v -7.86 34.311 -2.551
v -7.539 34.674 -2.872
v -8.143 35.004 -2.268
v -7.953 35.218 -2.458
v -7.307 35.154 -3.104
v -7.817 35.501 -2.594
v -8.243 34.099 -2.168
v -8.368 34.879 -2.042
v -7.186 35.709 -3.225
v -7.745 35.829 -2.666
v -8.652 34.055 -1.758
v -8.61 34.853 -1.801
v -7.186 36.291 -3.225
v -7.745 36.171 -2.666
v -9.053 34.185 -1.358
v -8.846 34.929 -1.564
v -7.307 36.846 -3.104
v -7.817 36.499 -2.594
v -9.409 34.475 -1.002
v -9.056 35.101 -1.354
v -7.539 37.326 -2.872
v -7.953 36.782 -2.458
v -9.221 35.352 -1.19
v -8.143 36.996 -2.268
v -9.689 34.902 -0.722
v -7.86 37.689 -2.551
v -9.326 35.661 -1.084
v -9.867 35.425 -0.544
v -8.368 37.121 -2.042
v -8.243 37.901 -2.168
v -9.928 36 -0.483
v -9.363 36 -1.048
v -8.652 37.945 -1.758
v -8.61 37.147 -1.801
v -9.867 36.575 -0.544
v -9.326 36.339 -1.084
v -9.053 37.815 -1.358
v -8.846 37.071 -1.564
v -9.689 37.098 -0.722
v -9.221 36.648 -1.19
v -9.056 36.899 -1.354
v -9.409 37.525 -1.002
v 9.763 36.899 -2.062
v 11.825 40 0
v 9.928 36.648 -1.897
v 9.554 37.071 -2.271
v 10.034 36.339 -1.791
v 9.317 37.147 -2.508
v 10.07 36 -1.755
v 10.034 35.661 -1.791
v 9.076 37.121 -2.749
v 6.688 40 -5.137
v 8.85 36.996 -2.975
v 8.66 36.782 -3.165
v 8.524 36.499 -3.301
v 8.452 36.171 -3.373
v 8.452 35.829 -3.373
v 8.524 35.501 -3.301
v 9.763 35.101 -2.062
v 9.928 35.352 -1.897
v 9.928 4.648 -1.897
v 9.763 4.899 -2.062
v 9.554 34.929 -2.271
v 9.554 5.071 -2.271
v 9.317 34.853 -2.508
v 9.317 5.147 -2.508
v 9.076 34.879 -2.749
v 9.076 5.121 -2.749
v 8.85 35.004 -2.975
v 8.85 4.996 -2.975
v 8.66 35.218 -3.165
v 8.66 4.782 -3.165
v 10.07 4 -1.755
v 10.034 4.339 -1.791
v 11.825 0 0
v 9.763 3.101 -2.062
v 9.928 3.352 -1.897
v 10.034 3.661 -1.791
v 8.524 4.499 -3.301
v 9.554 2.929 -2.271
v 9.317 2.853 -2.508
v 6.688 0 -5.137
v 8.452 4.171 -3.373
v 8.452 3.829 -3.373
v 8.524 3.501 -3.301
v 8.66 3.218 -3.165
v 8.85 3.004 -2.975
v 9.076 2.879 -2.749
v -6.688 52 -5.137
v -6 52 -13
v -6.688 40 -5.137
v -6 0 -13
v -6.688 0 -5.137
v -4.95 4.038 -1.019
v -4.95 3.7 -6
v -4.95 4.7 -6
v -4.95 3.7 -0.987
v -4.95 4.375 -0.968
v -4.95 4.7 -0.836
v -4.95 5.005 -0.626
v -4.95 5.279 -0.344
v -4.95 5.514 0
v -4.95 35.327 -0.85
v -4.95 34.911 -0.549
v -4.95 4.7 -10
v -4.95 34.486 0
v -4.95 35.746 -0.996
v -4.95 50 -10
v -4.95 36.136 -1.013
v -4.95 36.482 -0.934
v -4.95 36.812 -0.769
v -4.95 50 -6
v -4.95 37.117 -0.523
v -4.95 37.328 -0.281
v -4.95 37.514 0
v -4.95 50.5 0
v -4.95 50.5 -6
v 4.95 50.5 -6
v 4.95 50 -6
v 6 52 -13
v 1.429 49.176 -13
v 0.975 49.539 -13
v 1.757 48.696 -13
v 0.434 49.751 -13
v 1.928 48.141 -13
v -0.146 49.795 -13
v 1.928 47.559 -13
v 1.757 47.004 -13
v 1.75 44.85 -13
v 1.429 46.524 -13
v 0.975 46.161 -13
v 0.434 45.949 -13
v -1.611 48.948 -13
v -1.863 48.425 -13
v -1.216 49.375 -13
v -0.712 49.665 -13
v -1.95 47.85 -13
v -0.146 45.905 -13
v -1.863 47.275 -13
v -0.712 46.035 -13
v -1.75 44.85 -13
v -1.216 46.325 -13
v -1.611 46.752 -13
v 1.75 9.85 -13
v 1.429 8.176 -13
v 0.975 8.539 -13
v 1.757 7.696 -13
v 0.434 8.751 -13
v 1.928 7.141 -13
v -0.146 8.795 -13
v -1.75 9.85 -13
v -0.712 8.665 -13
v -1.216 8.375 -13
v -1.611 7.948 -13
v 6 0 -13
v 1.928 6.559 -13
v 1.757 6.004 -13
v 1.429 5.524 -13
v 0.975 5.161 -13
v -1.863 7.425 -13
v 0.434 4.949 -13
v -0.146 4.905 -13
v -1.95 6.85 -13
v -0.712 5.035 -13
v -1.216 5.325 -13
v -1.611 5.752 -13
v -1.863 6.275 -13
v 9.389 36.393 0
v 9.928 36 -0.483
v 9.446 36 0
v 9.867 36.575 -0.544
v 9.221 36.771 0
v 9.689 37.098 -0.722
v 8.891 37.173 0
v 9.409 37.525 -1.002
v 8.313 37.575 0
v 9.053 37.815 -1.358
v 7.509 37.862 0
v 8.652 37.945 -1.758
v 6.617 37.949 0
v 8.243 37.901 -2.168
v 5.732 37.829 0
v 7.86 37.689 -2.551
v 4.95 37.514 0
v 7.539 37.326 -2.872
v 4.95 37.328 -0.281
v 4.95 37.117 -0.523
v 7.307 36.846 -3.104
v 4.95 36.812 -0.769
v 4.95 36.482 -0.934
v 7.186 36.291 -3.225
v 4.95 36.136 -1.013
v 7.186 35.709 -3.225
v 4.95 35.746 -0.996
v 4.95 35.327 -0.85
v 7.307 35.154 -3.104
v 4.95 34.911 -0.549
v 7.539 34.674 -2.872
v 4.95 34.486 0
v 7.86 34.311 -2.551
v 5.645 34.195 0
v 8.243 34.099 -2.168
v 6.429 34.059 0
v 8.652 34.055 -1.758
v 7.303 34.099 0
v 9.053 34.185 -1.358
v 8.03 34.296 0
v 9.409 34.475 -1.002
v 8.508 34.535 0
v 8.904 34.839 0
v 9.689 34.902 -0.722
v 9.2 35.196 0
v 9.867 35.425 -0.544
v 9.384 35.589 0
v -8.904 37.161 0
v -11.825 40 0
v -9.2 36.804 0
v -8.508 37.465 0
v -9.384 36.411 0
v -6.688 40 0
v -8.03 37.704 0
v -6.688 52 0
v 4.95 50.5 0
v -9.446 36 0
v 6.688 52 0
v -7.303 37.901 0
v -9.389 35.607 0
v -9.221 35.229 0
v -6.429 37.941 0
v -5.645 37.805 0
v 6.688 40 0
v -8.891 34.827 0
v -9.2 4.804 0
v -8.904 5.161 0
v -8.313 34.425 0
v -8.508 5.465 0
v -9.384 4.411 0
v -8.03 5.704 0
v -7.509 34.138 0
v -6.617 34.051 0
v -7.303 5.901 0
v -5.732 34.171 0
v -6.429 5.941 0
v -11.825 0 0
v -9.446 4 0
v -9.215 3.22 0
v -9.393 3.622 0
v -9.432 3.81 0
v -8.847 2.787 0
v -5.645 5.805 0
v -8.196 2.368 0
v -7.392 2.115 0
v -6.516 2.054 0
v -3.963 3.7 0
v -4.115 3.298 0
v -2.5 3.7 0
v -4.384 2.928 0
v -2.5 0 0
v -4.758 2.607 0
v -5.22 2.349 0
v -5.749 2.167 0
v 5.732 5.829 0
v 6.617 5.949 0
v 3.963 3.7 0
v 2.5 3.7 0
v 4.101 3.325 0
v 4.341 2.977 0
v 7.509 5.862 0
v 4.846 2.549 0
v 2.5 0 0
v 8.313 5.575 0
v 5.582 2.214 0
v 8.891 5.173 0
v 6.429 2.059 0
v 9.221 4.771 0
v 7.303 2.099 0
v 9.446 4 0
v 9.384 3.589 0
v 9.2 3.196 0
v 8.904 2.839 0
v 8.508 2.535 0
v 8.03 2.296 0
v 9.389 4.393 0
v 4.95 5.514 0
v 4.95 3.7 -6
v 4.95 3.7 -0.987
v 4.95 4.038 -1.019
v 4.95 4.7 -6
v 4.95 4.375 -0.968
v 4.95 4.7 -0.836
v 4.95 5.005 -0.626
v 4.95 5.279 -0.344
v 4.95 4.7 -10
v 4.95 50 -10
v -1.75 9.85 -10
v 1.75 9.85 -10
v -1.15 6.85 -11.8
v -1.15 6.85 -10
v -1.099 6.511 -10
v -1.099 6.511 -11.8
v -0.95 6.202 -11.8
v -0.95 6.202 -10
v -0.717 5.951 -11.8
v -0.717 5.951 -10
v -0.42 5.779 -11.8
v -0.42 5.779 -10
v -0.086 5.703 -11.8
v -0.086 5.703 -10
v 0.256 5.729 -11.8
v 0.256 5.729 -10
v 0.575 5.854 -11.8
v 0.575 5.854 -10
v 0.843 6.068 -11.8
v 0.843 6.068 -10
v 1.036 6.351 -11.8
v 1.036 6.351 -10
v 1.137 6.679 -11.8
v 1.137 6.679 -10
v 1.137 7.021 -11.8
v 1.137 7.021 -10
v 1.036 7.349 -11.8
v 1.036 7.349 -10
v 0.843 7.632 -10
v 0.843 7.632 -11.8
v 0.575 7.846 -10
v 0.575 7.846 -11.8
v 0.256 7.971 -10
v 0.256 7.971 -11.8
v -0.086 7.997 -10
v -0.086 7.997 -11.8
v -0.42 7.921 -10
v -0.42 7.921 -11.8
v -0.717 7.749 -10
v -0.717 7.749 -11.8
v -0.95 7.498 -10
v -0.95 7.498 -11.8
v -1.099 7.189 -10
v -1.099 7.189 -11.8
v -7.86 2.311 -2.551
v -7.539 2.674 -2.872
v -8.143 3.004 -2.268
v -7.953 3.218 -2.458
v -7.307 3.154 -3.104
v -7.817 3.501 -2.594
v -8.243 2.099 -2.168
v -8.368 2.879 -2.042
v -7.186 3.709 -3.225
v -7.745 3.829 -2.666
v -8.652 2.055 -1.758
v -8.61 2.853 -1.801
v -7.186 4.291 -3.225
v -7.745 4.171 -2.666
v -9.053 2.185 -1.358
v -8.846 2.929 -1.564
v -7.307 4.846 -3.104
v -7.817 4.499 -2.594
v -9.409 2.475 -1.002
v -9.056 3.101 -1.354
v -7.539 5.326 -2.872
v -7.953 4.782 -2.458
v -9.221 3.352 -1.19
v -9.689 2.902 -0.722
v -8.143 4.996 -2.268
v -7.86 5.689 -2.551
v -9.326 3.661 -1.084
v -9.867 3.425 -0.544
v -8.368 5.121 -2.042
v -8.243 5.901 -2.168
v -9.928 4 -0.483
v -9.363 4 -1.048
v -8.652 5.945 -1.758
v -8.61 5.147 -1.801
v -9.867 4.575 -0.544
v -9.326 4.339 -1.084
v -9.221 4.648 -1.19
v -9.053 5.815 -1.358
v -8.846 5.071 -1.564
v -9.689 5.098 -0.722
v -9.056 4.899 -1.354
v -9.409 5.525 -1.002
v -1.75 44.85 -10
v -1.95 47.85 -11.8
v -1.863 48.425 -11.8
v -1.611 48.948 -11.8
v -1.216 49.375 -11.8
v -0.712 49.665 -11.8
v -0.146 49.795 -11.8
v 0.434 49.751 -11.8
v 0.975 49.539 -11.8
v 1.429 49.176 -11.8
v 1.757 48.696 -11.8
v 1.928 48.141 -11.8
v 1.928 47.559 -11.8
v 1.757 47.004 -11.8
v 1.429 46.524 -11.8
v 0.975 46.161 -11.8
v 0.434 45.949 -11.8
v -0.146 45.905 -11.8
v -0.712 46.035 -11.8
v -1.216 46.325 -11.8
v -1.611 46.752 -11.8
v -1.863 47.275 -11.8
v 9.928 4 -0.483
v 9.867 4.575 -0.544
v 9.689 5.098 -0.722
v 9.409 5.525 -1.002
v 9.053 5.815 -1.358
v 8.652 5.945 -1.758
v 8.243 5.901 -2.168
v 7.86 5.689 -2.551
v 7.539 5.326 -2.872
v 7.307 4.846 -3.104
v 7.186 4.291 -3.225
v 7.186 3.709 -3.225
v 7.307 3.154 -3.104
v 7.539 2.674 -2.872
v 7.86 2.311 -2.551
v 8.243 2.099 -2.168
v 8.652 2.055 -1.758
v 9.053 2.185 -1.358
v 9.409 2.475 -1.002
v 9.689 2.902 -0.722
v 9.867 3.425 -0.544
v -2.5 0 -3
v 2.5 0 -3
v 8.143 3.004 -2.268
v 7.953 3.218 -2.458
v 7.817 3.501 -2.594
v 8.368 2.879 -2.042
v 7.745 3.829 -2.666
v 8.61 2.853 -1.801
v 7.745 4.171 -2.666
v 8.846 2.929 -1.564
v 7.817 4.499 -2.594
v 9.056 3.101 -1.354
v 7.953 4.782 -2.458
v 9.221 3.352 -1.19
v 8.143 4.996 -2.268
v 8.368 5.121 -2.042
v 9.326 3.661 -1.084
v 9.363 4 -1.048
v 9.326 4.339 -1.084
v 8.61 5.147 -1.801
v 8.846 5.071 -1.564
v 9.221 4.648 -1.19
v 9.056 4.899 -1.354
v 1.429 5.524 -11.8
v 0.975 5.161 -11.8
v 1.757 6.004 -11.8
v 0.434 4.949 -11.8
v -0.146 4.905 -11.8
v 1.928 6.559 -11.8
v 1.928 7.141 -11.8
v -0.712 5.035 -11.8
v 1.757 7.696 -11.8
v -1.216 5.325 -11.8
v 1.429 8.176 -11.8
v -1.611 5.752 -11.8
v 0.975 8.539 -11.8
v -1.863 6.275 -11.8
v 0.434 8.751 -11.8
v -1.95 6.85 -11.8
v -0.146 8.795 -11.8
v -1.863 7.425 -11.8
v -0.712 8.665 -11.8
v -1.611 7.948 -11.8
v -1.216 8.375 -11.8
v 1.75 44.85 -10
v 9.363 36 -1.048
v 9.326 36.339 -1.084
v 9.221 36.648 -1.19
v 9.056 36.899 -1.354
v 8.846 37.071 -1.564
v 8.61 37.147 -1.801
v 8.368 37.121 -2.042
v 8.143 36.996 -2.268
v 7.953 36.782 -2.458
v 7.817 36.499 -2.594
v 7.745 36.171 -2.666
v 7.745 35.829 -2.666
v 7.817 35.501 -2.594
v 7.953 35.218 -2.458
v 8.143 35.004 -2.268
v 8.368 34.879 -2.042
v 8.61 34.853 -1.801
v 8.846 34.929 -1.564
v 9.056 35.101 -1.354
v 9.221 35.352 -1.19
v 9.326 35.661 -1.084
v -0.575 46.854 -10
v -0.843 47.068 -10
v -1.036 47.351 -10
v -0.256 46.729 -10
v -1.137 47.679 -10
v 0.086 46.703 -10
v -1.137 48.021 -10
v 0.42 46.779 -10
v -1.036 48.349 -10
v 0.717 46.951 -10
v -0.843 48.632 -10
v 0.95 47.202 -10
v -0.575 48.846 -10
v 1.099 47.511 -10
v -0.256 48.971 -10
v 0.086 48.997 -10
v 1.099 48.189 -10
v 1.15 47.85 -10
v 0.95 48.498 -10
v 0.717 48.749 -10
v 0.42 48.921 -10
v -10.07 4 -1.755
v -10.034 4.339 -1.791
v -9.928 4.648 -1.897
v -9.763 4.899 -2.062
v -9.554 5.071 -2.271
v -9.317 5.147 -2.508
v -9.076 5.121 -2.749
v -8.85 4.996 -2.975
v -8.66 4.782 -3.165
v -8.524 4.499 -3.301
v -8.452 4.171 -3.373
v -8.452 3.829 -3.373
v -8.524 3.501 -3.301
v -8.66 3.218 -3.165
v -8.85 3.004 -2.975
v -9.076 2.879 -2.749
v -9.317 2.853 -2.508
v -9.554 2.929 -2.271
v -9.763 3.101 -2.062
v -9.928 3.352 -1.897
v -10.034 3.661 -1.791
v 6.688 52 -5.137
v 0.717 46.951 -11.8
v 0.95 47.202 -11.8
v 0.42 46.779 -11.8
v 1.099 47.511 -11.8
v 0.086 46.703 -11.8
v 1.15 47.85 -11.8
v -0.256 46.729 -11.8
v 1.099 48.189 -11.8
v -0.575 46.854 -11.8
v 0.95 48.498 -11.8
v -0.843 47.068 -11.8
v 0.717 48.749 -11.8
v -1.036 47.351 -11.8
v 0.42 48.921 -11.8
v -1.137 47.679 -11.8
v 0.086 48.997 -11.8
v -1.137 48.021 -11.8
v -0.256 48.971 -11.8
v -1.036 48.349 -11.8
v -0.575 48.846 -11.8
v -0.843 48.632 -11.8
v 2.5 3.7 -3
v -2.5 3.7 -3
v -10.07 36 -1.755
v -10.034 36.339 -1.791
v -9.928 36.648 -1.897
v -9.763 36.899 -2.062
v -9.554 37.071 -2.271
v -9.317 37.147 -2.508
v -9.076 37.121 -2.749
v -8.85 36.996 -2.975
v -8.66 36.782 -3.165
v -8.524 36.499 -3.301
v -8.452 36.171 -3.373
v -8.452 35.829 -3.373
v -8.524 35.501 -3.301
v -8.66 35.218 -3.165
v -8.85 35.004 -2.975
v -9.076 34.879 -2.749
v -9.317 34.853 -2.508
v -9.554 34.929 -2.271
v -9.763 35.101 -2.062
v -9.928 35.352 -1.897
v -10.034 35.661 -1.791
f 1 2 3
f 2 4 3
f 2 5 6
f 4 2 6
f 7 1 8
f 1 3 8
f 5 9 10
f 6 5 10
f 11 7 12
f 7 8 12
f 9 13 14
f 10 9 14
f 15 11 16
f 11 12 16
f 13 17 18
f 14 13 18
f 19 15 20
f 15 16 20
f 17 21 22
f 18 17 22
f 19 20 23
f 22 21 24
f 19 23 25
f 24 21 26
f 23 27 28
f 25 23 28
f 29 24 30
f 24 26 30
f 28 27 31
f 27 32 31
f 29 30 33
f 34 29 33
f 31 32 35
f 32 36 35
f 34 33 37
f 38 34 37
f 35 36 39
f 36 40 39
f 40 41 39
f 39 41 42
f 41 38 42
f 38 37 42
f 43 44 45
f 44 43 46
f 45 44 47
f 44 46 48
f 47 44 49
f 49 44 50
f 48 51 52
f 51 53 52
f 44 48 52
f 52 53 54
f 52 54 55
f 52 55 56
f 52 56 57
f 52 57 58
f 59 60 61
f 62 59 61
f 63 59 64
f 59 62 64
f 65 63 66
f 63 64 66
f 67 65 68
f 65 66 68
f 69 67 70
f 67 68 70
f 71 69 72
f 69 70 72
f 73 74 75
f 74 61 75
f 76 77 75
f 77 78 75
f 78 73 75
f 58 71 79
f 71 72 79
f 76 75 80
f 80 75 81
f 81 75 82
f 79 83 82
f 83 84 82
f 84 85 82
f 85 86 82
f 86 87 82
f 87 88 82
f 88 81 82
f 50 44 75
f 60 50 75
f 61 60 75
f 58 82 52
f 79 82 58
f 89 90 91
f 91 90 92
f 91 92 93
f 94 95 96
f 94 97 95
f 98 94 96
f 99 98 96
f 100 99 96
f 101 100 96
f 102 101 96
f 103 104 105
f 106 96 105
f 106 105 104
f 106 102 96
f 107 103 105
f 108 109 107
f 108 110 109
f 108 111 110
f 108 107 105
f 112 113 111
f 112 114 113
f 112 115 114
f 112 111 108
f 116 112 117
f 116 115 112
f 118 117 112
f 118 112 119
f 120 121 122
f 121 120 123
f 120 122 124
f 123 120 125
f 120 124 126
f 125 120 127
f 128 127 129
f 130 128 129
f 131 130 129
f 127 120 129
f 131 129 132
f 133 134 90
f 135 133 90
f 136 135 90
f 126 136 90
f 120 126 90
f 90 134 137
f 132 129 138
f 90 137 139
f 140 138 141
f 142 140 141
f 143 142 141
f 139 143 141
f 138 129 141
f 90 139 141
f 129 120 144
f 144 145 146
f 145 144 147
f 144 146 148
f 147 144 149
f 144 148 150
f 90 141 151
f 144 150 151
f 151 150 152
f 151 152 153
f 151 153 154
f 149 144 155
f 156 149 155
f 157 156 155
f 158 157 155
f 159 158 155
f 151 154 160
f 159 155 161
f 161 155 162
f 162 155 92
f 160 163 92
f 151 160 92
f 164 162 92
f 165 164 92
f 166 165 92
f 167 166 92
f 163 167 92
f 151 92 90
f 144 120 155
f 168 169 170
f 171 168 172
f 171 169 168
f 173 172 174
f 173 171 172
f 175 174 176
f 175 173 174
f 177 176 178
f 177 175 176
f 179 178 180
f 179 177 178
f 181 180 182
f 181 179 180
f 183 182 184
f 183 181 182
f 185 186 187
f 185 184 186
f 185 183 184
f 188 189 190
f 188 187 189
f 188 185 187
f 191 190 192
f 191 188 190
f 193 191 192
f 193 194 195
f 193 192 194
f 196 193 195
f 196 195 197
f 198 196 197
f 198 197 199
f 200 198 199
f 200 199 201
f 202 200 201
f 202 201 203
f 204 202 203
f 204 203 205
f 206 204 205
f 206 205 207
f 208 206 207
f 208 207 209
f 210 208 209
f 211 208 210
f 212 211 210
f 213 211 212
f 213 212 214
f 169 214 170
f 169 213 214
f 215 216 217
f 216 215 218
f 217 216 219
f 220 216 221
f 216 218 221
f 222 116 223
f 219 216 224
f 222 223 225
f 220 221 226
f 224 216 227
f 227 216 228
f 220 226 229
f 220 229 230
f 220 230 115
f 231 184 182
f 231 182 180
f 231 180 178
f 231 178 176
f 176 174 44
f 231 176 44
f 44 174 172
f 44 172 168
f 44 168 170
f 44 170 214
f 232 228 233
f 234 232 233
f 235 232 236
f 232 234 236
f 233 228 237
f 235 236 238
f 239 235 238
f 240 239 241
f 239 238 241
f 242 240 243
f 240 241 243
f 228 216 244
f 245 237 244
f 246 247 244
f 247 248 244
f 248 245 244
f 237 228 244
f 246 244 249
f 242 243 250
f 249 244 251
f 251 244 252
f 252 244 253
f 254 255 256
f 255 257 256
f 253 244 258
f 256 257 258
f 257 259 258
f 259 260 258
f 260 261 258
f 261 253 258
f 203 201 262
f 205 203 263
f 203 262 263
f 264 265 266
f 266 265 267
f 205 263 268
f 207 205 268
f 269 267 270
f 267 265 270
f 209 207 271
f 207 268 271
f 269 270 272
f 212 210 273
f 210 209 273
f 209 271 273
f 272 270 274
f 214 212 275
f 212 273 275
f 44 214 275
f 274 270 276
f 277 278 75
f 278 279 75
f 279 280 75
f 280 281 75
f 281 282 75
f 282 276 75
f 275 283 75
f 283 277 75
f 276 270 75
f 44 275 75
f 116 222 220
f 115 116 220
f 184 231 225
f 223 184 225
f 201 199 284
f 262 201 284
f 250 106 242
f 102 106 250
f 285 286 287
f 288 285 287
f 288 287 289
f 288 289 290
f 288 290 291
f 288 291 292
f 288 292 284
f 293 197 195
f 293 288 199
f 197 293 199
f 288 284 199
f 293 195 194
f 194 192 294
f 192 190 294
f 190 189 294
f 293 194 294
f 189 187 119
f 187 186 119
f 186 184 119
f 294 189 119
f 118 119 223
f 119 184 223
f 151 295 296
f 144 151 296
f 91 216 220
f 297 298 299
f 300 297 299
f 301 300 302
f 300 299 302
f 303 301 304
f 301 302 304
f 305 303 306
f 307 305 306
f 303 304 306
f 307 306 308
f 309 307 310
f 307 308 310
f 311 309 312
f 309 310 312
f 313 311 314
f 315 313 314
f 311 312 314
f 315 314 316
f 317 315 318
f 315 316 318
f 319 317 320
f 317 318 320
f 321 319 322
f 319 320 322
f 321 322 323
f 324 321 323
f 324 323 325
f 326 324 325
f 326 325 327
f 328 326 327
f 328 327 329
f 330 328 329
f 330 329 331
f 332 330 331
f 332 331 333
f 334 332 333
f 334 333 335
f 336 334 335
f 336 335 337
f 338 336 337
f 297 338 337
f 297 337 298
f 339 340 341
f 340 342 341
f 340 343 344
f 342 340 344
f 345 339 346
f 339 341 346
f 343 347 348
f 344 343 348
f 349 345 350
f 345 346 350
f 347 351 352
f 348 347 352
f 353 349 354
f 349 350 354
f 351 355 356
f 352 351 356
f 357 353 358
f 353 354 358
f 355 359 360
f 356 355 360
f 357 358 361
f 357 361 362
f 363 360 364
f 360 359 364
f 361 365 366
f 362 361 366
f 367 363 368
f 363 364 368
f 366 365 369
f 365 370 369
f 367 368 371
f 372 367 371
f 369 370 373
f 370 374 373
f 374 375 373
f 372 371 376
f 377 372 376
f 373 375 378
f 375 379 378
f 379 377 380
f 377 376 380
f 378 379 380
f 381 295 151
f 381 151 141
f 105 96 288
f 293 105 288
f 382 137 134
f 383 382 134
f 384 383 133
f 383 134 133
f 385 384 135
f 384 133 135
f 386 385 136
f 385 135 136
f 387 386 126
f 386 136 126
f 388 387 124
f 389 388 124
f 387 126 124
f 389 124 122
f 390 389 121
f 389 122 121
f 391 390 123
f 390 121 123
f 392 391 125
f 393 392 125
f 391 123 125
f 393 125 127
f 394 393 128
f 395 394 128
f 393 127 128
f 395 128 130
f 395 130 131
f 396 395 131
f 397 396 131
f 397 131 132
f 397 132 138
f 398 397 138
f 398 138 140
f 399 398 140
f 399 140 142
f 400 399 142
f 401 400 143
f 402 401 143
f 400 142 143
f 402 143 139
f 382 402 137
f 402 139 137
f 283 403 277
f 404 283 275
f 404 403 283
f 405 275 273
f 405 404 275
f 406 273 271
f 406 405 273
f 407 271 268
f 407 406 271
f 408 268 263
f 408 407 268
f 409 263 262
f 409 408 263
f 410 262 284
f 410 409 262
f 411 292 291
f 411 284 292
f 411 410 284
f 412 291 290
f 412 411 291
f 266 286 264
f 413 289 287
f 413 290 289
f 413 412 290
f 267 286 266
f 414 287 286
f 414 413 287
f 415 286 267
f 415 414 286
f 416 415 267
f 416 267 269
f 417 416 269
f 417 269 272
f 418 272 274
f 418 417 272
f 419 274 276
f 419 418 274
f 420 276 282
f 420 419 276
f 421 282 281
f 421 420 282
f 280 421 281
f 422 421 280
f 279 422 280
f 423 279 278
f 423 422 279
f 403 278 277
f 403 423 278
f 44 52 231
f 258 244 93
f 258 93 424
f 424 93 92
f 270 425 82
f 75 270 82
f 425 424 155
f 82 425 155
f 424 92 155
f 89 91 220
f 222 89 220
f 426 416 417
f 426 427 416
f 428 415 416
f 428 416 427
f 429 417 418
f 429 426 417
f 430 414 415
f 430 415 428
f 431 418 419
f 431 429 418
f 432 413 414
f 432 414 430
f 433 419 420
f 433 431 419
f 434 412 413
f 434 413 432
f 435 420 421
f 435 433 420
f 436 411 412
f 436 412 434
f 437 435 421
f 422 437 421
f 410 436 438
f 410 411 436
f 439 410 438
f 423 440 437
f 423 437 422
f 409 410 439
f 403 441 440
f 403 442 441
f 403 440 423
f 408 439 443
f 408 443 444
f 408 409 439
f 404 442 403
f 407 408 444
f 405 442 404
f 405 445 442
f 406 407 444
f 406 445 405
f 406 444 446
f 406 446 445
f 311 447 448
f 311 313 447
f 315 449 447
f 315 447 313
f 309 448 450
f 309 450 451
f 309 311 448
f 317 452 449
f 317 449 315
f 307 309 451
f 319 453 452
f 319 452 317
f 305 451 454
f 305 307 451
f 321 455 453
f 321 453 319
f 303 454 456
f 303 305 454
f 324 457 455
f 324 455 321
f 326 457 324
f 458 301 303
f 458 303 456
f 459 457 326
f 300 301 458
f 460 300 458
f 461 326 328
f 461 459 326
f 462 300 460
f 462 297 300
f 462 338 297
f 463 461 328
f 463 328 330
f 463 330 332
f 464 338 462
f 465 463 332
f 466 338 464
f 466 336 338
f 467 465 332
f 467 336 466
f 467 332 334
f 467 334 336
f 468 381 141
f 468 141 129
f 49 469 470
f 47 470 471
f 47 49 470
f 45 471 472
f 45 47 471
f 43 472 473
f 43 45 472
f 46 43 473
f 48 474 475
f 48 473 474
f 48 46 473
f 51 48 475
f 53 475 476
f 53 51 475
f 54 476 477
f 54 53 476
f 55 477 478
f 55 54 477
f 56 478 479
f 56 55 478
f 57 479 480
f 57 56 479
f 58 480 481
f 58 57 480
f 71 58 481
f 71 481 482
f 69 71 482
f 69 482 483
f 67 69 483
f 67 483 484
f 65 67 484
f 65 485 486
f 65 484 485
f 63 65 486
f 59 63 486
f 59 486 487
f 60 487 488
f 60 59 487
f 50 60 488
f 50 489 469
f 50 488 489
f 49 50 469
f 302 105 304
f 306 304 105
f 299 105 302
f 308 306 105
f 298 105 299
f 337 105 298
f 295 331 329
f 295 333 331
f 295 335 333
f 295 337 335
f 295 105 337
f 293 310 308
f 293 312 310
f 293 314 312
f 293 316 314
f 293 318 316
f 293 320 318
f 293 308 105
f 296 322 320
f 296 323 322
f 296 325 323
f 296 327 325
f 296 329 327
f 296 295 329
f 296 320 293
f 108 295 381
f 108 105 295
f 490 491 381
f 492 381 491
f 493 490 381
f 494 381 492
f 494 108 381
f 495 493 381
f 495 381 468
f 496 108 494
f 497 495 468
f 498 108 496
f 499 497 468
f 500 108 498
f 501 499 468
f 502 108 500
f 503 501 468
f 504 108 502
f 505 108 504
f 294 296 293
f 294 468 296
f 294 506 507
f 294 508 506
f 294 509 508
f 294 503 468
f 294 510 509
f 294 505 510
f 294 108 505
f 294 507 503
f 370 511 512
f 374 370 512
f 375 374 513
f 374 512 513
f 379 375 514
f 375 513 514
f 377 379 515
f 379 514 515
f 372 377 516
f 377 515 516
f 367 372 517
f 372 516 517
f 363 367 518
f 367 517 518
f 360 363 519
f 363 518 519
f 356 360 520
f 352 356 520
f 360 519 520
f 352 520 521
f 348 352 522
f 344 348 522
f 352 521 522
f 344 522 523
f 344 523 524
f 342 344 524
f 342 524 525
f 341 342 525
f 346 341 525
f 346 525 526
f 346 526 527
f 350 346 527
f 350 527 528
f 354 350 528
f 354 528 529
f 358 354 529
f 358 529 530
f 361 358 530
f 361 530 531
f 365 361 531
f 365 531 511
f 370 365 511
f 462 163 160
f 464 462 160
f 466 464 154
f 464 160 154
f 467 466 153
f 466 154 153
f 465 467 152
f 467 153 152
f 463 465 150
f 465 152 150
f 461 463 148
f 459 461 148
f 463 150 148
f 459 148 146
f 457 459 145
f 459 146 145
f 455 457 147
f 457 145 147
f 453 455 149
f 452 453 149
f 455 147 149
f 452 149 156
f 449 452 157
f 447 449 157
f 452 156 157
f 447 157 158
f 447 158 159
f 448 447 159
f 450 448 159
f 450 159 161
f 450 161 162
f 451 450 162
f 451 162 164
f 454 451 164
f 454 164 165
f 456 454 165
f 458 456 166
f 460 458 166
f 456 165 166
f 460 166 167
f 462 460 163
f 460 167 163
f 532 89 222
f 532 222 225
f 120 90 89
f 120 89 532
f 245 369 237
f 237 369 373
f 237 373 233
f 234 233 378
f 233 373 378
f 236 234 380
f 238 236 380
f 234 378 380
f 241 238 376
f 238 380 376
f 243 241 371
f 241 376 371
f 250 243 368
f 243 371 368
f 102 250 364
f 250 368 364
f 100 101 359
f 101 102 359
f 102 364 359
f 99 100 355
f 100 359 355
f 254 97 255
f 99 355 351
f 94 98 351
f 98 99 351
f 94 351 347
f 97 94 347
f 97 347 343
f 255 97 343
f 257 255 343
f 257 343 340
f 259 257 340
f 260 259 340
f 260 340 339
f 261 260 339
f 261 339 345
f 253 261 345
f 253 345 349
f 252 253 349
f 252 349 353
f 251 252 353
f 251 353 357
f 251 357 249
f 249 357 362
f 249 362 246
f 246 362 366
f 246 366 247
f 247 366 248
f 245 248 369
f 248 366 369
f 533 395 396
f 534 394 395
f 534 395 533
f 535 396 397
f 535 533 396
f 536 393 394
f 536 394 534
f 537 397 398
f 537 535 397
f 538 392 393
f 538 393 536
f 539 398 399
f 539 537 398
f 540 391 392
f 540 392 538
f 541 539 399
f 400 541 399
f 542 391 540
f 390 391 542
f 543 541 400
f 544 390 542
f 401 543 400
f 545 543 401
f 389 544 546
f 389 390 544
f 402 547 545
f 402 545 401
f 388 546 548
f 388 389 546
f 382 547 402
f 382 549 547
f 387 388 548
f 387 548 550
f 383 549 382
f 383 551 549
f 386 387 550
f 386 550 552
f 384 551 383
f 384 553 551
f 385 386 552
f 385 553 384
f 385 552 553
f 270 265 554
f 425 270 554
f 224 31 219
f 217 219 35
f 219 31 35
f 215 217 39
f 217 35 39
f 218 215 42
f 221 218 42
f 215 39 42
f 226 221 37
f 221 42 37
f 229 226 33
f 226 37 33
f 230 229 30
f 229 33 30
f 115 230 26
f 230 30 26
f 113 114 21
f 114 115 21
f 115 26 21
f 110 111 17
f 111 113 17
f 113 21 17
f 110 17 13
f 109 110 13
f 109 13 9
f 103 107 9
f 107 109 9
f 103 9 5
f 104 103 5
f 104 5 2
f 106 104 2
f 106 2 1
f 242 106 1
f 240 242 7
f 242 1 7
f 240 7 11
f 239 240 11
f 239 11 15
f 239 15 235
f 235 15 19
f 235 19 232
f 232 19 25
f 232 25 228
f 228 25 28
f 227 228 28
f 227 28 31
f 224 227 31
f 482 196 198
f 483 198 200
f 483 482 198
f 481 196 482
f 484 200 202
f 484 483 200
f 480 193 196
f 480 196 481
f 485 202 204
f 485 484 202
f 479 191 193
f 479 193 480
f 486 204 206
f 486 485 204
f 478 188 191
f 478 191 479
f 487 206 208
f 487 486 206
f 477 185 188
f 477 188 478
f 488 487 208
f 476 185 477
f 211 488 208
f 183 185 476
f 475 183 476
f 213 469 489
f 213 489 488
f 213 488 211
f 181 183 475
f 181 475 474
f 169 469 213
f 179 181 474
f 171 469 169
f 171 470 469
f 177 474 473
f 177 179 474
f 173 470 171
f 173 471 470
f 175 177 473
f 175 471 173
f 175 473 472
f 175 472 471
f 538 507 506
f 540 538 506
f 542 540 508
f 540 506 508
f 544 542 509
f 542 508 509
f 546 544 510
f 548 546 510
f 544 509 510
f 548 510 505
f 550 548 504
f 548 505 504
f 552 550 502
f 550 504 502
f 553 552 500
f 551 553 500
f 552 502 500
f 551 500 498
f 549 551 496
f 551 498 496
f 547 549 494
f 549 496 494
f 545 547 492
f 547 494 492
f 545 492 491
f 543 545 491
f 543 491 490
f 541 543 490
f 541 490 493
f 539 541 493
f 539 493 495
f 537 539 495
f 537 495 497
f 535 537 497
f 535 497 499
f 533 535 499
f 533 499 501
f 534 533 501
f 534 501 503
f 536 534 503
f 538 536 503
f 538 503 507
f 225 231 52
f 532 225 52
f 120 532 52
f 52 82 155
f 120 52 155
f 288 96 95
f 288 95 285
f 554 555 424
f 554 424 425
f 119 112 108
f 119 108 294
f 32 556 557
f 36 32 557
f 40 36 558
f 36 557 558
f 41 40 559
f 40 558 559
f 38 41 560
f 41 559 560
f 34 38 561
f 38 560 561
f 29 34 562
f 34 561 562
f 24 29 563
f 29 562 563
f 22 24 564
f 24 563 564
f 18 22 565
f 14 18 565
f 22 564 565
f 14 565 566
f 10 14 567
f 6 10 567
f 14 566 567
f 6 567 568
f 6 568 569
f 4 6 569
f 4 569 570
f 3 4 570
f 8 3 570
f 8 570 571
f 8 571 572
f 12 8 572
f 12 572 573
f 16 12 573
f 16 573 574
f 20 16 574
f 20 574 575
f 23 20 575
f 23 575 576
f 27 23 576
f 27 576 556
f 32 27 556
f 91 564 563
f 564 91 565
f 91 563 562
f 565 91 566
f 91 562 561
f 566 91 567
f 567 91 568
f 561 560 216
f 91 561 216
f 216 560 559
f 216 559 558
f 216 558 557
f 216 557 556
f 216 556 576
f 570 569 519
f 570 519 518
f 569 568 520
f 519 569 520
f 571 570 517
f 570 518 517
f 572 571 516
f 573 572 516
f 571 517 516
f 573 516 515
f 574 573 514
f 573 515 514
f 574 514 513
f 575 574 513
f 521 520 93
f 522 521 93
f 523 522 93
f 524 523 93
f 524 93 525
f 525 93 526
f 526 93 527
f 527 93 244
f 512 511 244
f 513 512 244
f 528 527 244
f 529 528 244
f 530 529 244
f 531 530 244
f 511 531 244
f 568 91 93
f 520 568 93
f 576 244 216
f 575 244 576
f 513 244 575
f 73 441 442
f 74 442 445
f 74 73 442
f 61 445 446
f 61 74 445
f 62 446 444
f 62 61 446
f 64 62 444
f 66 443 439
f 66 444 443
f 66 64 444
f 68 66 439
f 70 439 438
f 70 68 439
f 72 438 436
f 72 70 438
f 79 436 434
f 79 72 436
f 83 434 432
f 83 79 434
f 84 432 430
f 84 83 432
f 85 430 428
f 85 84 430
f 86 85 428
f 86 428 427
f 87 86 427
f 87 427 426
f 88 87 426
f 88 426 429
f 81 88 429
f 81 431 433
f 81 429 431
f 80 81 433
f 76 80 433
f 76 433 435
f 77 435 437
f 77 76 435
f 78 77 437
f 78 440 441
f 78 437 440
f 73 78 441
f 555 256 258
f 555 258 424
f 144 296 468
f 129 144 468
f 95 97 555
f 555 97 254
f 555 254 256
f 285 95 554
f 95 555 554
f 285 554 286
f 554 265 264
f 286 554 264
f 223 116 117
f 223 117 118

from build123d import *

# Parameters (mm, degrees)
EXTRUDE_1_DEPTH     = 40
EXTRUDE_2_DEPTH     = 12
SKETCH_3_W          = 9.9
SKETCH_3_H          = 45.3
CUT_EXTRUDE_1_DEPTH = 10
SKETCH_4_W          = 3.5
SKETCH_4_H          = 35
CUT_EXTRUDE_2_DEPTH = 55.257079031
SKETCH_5_W          = 9.9
SKETCH_5_H          = 0.5
SKETCH_5_H_2        = 1
CUT_EXTRUDE_3_DEPTH = 6
SKETCH_6_R          = 1.15
CUT_EXTRUDE_4_DEPTH = 55.257079031
SKETCH_7_R          = 1.95
CUT_EXTRUDE_5_DEPTH = 1.2
SKETCH_10_R         = 1.15
CUT_EXTRUDE_6_DEPTH = 10
CUT_EXTRUDE_START   = -1
SKETCH_11_R         = 1.95
CUT_EXTRUDE_7_DEPTH = 10
SKETCH_12_W         = 5
SKETCH_12_H         = 3
CUT_EXTRUDE_8_DEPTH = 52.397671397


with BuildPart() as part:
    # 草图1 → 凸台-拉伸1 (new body)
    with BuildSketch(Plane(origin=(0, 0, 0), x_dir=(1, 0, 0), z_dir=(0, 1, 0))):
        Polygon((6.687916013, 5.137083987), (6, 13), (-6, 13), (-6.687916013, 5.137083987), (-11.825, 0), (11.825, 0), align=None)
    extrude(amount=EXTRUDE_1_DEPTH)

    # 草图2 → 凸台-拉伸2 (add)
    with BuildSketch(Plane(origin=(0, 40, 0), x_dir=(1, 0, 0), z_dir=(0, 1, 0))):
        Polygon((6.687916013, 5.137083987), (6, 13), (-6, 13), (-6.687916013, 5.137083987), (-6.687916013, 0), (6.687916013, 0), align=None)
    extrude(amount=EXTRUDE_2_DEPTH)

    # 草图3 → 切除-拉伸1 (cut)
    with BuildSketch(Plane.XY):
        with Locations((0, 27.35)):
            Rectangle(SKETCH_3_W, SKETCH_3_H)
    extrude(amount=-CUT_EXTRUDE_1_DEPTH, mode=Mode.SUBTRACT)

    # 草图4 → 切除-拉伸2 (cut, through all)
    with BuildSketch(Plane.XY.offset(-10)):
        with Locations((0, 27.35)):
            Rectangle(SKETCH_4_W, SKETCH_4_H)
    extrude(amount=-CUT_EXTRUDE_2_DEPTH, mode=Mode.SUBTRACT)

    # 草图5 → 切除-拉伸3 (cut)
    with BuildSketch(Plane.XY):
        with Locations((0, 50.25)):
            Rectangle(SKETCH_5_W, SKETCH_5_H)
        with Locations((0, 4.2)):
            Rectangle(SKETCH_5_W, SKETCH_5_H_2)
    extrude(amount=-CUT_EXTRUDE_3_DEPTH, mode=Mode.SUBTRACT)

    # 草图6 → 切除-拉伸4 (cut, through all)
    with BuildSketch(Plane.XY.offset(-10)):
        with Locations((0, 47.85)):
            Circle(SKETCH_6_R)
        with Locations(Location((0, 6.85, 0), (0, 0, 180))):
            Circle(SKETCH_6_R)
    extrude(amount=-CUT_EXTRUDE_4_DEPTH, mode=Mode.SUBTRACT)

    # 草图7 → 切除-拉伸5 (cut)
    with BuildSketch(Plane(origin=(0, 0, -13), x_dir=(-1, 0, 0), z_dir=(0, 0, -1))):
        with Locations((0, 47.85)):
            Circle(SKETCH_7_R)
        with Locations((0, 6.85)):
            Circle(SKETCH_7_R)
    extrude(amount=-CUT_EXTRUDE_5_DEPTH, mode=Mode.SUBTRACT)

    # 草图10 → 切除-拉伸6 (cut)
    with BuildSketch(Plane(origin=(-5.9125, 0, -5.9125), x_dir=(-0.7071067811865515, 0, 0.7071067811865437), z_dir=(-0.7071067811865437, 0, -0.7071067811865515))):
        with Locations((4.729070765, 36)):
            Circle(SKETCH_10_R)
        with Locations((4.729070765, 4)):
            Circle(SKETCH_10_R)
    cut_extrude_6 = extrude(amount=-CUT_EXTRUDE_6_DEPTH, mode=Mode.SUBTRACT)

    # 草图11 → 切除-拉伸7 (cut)
    with BuildSketch(Plane(origin=(-5.9125, 0, -5.9125), x_dir=(-0.7071067811865515, 0, 0.7071067811865437), z_dir=(-0.7071067811865437, 0, -0.7071067811865515)).offset(CUT_EXTRUDE_START)):
        with Locations((4.729070765, 36)):
            Circle(SKETCH_11_R)
        with Locations((4.729070765, 4)):
            Circle(SKETCH_11_R)
    cut_extrude_7 = extrude(amount=-CUT_EXTRUDE_7_DEPTH, mode=Mode.SUBTRACT)

    # 镜向1: 切除-拉伸6, 切除-拉伸7 across plane
    add(cut_extrude_6.mirror(Plane(origin=(0, 0, 0), x_dir=(0, 0, 1), z_dir=(1, 0, 0))), mode=Mode.SUBTRACT)
    add(cut_extrude_7.mirror(Plane(origin=(0, 0, 0), x_dir=(0, 0, 1), z_dir=(1, 0, 0))), mode=Mode.SUBTRACT)

    # 草图12 → 切除-拉伸8 (cut, through all)
    with BuildSketch(Plane(origin=(0, 3.7, 0), x_dir=(1, 0, 0), z_dir=(0, 1, 0))):
        with Locations((0, 1.5)):
            Rectangle(SKETCH_12_W, SKETCH_12_H)
    extrude(amount=-CUT_EXTRUDE_8_DEPTH, mode=Mode.SUBTRACT)


solid = part.part
